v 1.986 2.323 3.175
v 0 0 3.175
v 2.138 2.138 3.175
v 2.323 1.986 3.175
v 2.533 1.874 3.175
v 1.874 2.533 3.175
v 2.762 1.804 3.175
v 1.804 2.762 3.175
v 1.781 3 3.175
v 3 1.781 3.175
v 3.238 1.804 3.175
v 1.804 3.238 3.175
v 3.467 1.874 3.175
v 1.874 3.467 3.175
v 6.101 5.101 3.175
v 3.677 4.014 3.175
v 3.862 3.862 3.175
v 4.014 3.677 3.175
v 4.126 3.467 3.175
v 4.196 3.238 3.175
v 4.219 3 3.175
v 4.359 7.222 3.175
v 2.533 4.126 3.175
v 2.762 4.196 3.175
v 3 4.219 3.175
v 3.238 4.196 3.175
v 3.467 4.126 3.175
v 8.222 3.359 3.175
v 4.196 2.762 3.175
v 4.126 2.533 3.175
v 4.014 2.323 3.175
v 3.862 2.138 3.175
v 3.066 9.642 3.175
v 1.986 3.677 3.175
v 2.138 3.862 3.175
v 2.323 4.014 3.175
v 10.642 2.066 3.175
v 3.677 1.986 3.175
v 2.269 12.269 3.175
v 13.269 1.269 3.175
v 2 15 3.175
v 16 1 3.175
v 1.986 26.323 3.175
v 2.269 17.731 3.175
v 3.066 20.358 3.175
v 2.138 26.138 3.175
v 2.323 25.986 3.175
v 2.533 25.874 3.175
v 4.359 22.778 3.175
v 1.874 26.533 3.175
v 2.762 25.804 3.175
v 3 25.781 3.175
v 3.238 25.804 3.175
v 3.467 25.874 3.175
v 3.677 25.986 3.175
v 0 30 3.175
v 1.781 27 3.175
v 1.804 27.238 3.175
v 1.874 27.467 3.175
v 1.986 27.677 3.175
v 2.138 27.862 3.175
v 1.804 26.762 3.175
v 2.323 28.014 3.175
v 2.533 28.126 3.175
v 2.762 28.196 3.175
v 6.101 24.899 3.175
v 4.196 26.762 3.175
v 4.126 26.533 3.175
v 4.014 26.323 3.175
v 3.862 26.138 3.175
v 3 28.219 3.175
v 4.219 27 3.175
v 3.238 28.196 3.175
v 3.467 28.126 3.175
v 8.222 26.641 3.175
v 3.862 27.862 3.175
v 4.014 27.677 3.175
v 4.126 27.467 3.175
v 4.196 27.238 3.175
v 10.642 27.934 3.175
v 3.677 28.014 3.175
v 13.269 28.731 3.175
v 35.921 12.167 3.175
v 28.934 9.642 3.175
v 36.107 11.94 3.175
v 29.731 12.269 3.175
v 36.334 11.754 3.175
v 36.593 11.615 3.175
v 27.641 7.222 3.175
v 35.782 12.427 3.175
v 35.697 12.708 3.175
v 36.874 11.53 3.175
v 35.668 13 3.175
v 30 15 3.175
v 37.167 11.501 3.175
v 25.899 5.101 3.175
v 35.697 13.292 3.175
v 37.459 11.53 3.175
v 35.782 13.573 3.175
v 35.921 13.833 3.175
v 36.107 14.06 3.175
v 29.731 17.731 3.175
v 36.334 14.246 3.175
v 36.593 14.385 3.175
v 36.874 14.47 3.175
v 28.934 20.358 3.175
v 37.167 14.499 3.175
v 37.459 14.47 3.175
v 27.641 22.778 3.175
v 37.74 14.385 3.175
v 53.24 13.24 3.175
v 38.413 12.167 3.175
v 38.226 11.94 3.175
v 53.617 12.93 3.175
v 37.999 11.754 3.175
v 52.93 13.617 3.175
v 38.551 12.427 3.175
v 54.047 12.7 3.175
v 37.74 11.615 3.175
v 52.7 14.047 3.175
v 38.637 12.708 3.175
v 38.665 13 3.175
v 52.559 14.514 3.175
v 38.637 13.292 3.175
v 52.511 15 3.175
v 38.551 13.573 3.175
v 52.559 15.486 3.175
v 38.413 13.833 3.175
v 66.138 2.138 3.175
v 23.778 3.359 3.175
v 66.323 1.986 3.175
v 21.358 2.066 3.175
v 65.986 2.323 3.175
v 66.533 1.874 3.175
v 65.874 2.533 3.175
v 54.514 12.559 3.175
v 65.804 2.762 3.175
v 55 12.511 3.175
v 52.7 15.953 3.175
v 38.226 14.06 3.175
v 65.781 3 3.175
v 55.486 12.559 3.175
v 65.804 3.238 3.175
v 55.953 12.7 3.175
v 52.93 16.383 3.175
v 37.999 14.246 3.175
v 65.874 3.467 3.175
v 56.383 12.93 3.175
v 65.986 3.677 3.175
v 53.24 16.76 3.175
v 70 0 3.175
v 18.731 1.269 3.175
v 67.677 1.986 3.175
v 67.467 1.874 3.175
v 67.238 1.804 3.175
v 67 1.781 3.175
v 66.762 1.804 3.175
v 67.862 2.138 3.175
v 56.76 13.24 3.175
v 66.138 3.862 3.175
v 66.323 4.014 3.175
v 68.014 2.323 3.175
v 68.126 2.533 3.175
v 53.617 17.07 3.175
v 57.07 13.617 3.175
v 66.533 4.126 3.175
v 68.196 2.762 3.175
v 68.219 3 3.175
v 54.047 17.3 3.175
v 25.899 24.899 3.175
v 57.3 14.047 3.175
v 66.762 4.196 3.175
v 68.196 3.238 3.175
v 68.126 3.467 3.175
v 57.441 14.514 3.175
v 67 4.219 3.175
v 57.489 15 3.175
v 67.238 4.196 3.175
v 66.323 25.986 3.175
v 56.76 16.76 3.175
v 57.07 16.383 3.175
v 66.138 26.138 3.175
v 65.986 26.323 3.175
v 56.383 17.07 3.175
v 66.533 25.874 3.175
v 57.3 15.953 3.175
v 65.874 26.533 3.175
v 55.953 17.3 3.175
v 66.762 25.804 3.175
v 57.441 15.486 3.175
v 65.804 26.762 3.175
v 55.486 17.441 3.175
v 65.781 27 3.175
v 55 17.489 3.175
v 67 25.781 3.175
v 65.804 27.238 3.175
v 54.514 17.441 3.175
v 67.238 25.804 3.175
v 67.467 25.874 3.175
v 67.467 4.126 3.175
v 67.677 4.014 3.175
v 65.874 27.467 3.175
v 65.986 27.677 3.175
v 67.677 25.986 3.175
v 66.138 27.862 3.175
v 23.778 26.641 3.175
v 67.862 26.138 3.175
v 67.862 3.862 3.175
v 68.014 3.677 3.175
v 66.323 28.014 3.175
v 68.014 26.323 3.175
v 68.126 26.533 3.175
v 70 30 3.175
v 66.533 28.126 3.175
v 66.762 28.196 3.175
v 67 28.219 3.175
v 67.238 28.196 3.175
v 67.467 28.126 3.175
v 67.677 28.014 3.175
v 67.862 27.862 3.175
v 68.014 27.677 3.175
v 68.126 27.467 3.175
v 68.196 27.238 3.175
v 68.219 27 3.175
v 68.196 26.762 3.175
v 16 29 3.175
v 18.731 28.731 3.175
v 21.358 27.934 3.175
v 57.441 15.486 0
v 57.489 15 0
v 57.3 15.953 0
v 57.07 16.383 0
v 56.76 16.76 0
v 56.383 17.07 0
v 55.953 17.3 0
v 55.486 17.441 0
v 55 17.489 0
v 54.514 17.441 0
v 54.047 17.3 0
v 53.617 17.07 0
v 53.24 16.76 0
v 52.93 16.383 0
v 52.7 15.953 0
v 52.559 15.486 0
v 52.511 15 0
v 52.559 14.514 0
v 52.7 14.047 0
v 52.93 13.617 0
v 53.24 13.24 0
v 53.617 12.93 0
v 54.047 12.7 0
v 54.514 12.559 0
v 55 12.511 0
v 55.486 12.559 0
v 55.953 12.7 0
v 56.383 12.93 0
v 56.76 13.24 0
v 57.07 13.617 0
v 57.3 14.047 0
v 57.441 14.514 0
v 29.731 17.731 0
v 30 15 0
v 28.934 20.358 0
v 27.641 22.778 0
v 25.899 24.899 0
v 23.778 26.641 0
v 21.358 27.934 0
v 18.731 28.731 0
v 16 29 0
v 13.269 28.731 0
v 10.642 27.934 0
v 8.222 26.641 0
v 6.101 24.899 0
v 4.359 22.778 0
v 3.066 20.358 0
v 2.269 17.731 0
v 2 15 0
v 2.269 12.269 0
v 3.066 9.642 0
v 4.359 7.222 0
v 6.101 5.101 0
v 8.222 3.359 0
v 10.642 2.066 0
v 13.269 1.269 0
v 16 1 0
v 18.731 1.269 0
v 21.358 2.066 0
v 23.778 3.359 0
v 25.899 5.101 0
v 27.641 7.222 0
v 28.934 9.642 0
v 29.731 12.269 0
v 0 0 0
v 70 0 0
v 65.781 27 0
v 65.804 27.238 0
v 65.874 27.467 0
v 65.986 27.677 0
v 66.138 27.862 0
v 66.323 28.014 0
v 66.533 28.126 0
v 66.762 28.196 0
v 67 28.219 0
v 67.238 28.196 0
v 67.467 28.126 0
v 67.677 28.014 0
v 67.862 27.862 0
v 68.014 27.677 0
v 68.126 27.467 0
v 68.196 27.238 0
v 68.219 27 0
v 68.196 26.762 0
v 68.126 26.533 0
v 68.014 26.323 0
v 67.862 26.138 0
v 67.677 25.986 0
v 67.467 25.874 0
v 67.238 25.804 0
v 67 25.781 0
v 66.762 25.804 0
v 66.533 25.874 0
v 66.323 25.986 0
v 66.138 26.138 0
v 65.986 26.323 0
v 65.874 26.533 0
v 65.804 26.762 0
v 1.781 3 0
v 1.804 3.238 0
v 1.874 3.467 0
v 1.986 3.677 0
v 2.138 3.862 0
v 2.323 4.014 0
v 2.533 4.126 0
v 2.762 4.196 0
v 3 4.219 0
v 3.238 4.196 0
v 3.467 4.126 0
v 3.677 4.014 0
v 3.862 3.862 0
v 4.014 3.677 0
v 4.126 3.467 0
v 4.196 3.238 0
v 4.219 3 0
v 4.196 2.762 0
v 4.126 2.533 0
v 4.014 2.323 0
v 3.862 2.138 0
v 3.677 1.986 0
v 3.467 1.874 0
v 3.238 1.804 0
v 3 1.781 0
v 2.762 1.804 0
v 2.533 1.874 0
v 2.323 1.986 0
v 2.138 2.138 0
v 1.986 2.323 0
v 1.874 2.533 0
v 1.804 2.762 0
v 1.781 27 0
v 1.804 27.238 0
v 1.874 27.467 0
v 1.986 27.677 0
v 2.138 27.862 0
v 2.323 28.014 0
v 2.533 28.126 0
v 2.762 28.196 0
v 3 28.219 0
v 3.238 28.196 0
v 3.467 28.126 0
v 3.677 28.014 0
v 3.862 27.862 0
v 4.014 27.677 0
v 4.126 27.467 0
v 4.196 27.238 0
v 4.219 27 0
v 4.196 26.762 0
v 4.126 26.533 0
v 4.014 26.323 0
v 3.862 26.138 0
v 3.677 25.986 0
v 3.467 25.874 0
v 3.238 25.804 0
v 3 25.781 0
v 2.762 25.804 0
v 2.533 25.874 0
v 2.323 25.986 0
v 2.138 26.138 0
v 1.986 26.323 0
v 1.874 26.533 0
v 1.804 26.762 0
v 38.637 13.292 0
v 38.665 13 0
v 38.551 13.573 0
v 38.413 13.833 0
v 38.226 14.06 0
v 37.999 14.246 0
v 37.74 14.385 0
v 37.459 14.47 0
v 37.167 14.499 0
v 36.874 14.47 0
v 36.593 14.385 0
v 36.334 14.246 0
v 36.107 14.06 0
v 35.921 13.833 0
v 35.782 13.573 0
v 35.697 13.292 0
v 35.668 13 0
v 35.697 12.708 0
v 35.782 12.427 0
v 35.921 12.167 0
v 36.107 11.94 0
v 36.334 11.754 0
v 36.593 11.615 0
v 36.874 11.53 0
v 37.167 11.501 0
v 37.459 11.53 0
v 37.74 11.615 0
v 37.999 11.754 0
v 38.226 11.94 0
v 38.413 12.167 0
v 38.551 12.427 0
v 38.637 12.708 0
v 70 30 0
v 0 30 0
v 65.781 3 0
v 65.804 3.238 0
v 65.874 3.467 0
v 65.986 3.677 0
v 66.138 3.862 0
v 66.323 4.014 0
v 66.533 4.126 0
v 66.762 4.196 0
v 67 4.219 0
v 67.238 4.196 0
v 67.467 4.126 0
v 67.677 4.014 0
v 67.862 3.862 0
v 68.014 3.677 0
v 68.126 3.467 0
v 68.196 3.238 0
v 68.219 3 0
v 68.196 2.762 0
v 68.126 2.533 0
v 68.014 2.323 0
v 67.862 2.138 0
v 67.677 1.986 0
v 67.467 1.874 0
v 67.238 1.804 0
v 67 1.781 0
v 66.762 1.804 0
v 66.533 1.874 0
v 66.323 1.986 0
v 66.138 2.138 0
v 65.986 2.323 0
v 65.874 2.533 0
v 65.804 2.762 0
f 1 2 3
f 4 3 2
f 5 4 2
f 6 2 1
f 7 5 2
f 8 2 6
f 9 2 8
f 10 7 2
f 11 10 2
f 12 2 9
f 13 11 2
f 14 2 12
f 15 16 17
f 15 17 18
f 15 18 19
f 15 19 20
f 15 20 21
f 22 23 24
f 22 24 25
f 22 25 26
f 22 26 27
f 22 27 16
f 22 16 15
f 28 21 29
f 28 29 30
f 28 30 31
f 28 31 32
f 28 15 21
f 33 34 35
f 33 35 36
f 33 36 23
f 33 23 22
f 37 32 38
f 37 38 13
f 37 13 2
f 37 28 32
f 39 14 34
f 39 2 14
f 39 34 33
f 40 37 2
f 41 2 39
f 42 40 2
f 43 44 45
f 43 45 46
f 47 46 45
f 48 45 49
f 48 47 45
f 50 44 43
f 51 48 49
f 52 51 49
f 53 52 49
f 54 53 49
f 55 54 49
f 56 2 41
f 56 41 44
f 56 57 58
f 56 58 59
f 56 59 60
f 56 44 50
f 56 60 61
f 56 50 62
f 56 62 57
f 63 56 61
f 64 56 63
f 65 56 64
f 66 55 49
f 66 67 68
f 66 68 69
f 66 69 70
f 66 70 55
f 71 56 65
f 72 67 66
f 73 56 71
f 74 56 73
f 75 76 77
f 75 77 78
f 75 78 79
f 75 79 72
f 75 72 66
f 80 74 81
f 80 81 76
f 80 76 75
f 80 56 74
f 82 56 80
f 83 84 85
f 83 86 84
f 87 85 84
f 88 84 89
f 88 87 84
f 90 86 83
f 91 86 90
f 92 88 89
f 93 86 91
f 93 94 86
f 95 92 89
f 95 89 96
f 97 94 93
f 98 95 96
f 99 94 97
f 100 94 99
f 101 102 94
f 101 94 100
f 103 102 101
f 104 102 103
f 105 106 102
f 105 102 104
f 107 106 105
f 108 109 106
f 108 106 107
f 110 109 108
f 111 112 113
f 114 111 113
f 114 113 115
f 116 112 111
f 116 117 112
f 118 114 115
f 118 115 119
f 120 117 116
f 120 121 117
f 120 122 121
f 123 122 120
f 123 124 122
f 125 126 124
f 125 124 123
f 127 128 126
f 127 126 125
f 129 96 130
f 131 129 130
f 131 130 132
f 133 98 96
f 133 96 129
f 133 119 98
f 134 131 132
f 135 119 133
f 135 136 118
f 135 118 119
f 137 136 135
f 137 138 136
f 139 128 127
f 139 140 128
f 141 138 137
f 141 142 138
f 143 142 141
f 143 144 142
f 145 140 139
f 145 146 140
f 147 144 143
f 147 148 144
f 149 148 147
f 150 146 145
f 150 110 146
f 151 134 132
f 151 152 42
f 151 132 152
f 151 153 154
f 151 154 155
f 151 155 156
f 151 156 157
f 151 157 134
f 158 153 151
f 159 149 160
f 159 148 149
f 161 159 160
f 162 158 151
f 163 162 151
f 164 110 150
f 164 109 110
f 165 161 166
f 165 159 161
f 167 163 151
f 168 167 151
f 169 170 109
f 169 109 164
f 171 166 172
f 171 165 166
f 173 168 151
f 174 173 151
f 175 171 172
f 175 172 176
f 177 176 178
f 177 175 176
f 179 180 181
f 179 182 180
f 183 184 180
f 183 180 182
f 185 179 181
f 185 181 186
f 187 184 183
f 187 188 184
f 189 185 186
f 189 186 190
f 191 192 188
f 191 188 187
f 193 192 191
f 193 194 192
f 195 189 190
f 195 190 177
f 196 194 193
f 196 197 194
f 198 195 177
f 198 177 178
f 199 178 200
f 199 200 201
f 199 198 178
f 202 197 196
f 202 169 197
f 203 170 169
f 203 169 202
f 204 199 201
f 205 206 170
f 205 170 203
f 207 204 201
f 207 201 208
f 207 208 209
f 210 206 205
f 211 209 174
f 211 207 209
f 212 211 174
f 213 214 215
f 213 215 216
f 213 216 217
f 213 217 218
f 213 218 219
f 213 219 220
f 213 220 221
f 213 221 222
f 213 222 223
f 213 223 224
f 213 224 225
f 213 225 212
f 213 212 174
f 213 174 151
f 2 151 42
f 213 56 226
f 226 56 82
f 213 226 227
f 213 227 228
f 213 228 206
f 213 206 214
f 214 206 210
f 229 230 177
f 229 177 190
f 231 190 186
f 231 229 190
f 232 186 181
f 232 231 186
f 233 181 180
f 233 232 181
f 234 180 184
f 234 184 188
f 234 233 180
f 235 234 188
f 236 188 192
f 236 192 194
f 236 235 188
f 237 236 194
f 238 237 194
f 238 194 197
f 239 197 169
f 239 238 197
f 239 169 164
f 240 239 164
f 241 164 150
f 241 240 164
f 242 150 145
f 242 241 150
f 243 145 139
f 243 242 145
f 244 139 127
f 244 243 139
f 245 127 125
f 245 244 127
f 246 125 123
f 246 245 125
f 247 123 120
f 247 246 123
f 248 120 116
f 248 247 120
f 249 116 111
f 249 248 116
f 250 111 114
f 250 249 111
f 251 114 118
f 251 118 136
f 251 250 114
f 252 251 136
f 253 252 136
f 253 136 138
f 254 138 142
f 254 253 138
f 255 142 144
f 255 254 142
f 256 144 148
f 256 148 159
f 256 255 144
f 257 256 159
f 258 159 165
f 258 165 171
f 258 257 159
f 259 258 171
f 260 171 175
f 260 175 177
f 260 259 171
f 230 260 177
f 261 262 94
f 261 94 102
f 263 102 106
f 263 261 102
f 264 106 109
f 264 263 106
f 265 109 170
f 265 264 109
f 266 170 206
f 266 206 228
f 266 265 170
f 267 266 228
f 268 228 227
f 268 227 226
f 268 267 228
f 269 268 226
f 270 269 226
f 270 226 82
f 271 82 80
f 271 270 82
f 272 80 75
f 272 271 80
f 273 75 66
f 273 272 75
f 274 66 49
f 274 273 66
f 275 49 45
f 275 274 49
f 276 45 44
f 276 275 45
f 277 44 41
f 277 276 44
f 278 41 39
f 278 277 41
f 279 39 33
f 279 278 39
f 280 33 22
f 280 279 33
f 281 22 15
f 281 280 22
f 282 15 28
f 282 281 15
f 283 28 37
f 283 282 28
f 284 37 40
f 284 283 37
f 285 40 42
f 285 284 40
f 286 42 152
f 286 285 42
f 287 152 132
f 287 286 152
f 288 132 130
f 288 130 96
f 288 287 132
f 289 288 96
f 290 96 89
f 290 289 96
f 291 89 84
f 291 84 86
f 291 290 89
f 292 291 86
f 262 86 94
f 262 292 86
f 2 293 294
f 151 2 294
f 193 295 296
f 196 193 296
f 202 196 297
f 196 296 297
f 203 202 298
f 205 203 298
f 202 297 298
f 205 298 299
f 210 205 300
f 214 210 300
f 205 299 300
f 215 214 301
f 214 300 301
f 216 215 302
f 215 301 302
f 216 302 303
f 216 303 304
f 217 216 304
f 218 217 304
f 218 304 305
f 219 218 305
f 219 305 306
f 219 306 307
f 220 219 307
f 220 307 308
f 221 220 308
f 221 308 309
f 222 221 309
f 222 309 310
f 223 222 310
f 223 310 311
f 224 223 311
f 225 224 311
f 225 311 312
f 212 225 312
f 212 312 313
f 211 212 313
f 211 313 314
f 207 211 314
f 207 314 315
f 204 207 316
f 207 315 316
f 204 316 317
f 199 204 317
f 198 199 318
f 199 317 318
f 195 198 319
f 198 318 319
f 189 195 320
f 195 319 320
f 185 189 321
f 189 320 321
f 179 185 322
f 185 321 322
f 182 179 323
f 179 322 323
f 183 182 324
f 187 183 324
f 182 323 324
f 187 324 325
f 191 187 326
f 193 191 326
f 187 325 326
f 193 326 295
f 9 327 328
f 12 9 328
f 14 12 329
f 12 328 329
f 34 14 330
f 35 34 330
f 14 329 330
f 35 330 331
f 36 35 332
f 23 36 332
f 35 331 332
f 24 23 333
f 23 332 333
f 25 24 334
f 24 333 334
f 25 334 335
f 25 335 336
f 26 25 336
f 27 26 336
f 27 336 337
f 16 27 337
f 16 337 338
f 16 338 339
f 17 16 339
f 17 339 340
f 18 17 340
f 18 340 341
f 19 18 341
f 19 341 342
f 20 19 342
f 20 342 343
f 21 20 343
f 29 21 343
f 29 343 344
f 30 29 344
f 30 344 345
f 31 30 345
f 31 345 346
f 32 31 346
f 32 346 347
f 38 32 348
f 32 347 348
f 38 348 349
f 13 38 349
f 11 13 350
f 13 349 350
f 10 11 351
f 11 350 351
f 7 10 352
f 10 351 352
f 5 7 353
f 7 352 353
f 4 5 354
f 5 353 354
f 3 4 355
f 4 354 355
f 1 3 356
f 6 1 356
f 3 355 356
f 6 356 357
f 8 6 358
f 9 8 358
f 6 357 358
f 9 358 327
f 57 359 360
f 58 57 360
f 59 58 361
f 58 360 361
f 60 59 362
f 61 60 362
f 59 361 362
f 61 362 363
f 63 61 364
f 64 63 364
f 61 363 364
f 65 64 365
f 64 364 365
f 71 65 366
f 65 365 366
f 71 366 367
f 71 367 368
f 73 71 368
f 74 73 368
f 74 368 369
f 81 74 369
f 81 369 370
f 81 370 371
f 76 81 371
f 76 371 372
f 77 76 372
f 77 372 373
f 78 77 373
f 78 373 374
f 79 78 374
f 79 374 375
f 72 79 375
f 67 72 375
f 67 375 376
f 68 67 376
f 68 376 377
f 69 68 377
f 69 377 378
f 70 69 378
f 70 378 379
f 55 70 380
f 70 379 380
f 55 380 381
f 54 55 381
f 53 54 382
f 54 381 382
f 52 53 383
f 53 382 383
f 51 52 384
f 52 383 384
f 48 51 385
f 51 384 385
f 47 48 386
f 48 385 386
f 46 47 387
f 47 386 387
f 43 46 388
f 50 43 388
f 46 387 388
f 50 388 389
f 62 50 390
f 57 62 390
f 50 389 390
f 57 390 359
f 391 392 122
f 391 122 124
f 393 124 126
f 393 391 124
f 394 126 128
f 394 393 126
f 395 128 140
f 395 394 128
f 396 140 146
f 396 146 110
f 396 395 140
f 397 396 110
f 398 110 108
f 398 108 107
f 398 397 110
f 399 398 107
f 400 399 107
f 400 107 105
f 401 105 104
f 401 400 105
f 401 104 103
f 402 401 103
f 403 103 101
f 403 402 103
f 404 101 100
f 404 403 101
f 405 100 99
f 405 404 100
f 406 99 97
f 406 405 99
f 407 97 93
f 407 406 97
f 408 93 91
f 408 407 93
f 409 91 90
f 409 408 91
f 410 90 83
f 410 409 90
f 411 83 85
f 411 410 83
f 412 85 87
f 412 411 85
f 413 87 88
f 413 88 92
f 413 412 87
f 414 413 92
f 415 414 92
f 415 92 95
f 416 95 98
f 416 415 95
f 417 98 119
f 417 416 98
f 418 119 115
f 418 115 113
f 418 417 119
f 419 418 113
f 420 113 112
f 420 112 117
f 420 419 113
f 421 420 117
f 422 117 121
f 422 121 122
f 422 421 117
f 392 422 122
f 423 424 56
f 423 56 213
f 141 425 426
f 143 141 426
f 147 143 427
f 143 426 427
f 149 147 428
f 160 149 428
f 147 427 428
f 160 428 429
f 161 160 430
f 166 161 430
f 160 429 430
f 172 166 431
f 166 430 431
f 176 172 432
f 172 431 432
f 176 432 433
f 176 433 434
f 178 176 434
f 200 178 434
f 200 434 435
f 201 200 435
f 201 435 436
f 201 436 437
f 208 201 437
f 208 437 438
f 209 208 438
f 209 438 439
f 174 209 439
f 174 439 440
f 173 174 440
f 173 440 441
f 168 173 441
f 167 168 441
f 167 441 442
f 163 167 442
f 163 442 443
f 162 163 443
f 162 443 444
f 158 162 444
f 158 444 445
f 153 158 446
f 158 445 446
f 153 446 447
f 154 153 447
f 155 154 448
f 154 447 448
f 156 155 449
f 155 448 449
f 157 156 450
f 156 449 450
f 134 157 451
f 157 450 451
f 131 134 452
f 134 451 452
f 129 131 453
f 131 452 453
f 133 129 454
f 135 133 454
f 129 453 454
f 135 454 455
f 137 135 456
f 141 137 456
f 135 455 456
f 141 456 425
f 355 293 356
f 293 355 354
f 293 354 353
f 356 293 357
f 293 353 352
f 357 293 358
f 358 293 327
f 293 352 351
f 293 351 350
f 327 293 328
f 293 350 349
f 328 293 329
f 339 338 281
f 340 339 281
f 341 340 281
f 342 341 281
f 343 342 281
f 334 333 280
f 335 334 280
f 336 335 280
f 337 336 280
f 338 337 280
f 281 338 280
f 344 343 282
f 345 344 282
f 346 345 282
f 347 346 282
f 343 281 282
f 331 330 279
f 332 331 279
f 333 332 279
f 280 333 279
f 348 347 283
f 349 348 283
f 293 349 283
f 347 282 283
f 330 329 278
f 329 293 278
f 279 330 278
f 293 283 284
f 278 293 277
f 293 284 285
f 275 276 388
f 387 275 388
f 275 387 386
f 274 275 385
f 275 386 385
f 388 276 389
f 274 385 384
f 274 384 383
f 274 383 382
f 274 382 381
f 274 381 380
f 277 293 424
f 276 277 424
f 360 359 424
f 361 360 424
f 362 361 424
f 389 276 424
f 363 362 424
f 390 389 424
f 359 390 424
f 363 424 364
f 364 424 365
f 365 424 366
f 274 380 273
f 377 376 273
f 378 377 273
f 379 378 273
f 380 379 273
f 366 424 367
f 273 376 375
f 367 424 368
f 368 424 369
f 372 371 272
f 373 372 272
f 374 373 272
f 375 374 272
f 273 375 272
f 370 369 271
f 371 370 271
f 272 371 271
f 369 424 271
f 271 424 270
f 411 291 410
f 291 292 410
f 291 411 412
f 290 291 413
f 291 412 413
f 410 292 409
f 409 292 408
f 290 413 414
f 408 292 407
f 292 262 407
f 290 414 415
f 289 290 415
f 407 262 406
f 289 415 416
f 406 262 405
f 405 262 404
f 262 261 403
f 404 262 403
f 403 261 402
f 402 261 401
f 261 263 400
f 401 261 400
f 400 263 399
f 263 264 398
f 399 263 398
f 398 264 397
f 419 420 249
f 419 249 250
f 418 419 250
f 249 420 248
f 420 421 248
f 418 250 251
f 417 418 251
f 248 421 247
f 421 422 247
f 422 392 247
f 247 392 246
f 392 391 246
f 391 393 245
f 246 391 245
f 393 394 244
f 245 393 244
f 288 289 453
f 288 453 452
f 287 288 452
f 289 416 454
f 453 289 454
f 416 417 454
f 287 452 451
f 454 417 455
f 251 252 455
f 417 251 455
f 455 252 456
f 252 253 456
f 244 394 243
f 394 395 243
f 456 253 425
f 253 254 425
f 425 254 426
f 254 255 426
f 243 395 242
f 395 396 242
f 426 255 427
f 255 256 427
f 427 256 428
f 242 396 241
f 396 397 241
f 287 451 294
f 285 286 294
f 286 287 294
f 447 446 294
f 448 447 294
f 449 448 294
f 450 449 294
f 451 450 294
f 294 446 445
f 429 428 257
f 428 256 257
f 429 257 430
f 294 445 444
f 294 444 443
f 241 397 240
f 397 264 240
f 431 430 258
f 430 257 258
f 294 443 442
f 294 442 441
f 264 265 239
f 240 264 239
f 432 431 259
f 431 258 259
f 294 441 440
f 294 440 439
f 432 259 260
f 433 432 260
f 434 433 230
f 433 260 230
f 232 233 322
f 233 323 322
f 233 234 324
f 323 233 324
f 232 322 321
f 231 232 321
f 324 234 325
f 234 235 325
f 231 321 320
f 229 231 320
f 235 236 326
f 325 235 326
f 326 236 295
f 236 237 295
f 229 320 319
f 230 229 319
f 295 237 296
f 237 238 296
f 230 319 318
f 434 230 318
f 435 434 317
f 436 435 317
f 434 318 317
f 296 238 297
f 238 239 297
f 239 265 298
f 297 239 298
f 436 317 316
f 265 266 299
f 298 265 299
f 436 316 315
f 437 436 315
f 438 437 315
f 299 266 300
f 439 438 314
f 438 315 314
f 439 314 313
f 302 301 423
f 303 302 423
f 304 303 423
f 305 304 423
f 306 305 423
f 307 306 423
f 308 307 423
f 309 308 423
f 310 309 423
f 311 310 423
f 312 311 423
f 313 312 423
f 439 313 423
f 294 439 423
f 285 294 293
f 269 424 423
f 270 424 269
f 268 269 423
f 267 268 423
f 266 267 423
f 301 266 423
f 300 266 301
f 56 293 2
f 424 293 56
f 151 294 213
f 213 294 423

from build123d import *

# Parameters (mm, degrees)
SKETCH1_W             = 70
SKETCH1_H             = 30
SKETCH1_R             = 2.4892
SKETCH1_R_2           = 1.4986
SKETCH1_R_3           = 14
BOSS_EXTRUDE2_DEPTH   = 3.175
F_2_CLEARANCE_HOLE1_D = 2.4384


with BuildPart() as part:
    # Sketch1 → Boss-Extrude2 (new body)
    with BuildSketch(Plane.XY):
        with Locations((35, 15)):
            Rectangle(SKETCH1_W, SKETCH1_H)
        with Locations((55, 15)):
            Circle(SKETCH1_R, mode=Mode.SUBTRACT)
        with Locations((37.166699296, 13)):
            Circle(SKETCH1_R_2, mode=Mode.SUBTRACT)
        with Locations((16, 15)):
            Circle(SKETCH1_R_3, mode=Mode.SUBTRACT)
    extrude(amount=BOSS_EXTRUDE2_DEPTH)

    # #2 Clearance Hole1 (through all)
    with Locations(Plane.XY.offset(3.175)):
        with Locations((67, 3), (67, 27), (3, 27), (3, 3)):
            Hole(F_2_CLEARANCE_HOLE1_D / 2)


solid = part.part
